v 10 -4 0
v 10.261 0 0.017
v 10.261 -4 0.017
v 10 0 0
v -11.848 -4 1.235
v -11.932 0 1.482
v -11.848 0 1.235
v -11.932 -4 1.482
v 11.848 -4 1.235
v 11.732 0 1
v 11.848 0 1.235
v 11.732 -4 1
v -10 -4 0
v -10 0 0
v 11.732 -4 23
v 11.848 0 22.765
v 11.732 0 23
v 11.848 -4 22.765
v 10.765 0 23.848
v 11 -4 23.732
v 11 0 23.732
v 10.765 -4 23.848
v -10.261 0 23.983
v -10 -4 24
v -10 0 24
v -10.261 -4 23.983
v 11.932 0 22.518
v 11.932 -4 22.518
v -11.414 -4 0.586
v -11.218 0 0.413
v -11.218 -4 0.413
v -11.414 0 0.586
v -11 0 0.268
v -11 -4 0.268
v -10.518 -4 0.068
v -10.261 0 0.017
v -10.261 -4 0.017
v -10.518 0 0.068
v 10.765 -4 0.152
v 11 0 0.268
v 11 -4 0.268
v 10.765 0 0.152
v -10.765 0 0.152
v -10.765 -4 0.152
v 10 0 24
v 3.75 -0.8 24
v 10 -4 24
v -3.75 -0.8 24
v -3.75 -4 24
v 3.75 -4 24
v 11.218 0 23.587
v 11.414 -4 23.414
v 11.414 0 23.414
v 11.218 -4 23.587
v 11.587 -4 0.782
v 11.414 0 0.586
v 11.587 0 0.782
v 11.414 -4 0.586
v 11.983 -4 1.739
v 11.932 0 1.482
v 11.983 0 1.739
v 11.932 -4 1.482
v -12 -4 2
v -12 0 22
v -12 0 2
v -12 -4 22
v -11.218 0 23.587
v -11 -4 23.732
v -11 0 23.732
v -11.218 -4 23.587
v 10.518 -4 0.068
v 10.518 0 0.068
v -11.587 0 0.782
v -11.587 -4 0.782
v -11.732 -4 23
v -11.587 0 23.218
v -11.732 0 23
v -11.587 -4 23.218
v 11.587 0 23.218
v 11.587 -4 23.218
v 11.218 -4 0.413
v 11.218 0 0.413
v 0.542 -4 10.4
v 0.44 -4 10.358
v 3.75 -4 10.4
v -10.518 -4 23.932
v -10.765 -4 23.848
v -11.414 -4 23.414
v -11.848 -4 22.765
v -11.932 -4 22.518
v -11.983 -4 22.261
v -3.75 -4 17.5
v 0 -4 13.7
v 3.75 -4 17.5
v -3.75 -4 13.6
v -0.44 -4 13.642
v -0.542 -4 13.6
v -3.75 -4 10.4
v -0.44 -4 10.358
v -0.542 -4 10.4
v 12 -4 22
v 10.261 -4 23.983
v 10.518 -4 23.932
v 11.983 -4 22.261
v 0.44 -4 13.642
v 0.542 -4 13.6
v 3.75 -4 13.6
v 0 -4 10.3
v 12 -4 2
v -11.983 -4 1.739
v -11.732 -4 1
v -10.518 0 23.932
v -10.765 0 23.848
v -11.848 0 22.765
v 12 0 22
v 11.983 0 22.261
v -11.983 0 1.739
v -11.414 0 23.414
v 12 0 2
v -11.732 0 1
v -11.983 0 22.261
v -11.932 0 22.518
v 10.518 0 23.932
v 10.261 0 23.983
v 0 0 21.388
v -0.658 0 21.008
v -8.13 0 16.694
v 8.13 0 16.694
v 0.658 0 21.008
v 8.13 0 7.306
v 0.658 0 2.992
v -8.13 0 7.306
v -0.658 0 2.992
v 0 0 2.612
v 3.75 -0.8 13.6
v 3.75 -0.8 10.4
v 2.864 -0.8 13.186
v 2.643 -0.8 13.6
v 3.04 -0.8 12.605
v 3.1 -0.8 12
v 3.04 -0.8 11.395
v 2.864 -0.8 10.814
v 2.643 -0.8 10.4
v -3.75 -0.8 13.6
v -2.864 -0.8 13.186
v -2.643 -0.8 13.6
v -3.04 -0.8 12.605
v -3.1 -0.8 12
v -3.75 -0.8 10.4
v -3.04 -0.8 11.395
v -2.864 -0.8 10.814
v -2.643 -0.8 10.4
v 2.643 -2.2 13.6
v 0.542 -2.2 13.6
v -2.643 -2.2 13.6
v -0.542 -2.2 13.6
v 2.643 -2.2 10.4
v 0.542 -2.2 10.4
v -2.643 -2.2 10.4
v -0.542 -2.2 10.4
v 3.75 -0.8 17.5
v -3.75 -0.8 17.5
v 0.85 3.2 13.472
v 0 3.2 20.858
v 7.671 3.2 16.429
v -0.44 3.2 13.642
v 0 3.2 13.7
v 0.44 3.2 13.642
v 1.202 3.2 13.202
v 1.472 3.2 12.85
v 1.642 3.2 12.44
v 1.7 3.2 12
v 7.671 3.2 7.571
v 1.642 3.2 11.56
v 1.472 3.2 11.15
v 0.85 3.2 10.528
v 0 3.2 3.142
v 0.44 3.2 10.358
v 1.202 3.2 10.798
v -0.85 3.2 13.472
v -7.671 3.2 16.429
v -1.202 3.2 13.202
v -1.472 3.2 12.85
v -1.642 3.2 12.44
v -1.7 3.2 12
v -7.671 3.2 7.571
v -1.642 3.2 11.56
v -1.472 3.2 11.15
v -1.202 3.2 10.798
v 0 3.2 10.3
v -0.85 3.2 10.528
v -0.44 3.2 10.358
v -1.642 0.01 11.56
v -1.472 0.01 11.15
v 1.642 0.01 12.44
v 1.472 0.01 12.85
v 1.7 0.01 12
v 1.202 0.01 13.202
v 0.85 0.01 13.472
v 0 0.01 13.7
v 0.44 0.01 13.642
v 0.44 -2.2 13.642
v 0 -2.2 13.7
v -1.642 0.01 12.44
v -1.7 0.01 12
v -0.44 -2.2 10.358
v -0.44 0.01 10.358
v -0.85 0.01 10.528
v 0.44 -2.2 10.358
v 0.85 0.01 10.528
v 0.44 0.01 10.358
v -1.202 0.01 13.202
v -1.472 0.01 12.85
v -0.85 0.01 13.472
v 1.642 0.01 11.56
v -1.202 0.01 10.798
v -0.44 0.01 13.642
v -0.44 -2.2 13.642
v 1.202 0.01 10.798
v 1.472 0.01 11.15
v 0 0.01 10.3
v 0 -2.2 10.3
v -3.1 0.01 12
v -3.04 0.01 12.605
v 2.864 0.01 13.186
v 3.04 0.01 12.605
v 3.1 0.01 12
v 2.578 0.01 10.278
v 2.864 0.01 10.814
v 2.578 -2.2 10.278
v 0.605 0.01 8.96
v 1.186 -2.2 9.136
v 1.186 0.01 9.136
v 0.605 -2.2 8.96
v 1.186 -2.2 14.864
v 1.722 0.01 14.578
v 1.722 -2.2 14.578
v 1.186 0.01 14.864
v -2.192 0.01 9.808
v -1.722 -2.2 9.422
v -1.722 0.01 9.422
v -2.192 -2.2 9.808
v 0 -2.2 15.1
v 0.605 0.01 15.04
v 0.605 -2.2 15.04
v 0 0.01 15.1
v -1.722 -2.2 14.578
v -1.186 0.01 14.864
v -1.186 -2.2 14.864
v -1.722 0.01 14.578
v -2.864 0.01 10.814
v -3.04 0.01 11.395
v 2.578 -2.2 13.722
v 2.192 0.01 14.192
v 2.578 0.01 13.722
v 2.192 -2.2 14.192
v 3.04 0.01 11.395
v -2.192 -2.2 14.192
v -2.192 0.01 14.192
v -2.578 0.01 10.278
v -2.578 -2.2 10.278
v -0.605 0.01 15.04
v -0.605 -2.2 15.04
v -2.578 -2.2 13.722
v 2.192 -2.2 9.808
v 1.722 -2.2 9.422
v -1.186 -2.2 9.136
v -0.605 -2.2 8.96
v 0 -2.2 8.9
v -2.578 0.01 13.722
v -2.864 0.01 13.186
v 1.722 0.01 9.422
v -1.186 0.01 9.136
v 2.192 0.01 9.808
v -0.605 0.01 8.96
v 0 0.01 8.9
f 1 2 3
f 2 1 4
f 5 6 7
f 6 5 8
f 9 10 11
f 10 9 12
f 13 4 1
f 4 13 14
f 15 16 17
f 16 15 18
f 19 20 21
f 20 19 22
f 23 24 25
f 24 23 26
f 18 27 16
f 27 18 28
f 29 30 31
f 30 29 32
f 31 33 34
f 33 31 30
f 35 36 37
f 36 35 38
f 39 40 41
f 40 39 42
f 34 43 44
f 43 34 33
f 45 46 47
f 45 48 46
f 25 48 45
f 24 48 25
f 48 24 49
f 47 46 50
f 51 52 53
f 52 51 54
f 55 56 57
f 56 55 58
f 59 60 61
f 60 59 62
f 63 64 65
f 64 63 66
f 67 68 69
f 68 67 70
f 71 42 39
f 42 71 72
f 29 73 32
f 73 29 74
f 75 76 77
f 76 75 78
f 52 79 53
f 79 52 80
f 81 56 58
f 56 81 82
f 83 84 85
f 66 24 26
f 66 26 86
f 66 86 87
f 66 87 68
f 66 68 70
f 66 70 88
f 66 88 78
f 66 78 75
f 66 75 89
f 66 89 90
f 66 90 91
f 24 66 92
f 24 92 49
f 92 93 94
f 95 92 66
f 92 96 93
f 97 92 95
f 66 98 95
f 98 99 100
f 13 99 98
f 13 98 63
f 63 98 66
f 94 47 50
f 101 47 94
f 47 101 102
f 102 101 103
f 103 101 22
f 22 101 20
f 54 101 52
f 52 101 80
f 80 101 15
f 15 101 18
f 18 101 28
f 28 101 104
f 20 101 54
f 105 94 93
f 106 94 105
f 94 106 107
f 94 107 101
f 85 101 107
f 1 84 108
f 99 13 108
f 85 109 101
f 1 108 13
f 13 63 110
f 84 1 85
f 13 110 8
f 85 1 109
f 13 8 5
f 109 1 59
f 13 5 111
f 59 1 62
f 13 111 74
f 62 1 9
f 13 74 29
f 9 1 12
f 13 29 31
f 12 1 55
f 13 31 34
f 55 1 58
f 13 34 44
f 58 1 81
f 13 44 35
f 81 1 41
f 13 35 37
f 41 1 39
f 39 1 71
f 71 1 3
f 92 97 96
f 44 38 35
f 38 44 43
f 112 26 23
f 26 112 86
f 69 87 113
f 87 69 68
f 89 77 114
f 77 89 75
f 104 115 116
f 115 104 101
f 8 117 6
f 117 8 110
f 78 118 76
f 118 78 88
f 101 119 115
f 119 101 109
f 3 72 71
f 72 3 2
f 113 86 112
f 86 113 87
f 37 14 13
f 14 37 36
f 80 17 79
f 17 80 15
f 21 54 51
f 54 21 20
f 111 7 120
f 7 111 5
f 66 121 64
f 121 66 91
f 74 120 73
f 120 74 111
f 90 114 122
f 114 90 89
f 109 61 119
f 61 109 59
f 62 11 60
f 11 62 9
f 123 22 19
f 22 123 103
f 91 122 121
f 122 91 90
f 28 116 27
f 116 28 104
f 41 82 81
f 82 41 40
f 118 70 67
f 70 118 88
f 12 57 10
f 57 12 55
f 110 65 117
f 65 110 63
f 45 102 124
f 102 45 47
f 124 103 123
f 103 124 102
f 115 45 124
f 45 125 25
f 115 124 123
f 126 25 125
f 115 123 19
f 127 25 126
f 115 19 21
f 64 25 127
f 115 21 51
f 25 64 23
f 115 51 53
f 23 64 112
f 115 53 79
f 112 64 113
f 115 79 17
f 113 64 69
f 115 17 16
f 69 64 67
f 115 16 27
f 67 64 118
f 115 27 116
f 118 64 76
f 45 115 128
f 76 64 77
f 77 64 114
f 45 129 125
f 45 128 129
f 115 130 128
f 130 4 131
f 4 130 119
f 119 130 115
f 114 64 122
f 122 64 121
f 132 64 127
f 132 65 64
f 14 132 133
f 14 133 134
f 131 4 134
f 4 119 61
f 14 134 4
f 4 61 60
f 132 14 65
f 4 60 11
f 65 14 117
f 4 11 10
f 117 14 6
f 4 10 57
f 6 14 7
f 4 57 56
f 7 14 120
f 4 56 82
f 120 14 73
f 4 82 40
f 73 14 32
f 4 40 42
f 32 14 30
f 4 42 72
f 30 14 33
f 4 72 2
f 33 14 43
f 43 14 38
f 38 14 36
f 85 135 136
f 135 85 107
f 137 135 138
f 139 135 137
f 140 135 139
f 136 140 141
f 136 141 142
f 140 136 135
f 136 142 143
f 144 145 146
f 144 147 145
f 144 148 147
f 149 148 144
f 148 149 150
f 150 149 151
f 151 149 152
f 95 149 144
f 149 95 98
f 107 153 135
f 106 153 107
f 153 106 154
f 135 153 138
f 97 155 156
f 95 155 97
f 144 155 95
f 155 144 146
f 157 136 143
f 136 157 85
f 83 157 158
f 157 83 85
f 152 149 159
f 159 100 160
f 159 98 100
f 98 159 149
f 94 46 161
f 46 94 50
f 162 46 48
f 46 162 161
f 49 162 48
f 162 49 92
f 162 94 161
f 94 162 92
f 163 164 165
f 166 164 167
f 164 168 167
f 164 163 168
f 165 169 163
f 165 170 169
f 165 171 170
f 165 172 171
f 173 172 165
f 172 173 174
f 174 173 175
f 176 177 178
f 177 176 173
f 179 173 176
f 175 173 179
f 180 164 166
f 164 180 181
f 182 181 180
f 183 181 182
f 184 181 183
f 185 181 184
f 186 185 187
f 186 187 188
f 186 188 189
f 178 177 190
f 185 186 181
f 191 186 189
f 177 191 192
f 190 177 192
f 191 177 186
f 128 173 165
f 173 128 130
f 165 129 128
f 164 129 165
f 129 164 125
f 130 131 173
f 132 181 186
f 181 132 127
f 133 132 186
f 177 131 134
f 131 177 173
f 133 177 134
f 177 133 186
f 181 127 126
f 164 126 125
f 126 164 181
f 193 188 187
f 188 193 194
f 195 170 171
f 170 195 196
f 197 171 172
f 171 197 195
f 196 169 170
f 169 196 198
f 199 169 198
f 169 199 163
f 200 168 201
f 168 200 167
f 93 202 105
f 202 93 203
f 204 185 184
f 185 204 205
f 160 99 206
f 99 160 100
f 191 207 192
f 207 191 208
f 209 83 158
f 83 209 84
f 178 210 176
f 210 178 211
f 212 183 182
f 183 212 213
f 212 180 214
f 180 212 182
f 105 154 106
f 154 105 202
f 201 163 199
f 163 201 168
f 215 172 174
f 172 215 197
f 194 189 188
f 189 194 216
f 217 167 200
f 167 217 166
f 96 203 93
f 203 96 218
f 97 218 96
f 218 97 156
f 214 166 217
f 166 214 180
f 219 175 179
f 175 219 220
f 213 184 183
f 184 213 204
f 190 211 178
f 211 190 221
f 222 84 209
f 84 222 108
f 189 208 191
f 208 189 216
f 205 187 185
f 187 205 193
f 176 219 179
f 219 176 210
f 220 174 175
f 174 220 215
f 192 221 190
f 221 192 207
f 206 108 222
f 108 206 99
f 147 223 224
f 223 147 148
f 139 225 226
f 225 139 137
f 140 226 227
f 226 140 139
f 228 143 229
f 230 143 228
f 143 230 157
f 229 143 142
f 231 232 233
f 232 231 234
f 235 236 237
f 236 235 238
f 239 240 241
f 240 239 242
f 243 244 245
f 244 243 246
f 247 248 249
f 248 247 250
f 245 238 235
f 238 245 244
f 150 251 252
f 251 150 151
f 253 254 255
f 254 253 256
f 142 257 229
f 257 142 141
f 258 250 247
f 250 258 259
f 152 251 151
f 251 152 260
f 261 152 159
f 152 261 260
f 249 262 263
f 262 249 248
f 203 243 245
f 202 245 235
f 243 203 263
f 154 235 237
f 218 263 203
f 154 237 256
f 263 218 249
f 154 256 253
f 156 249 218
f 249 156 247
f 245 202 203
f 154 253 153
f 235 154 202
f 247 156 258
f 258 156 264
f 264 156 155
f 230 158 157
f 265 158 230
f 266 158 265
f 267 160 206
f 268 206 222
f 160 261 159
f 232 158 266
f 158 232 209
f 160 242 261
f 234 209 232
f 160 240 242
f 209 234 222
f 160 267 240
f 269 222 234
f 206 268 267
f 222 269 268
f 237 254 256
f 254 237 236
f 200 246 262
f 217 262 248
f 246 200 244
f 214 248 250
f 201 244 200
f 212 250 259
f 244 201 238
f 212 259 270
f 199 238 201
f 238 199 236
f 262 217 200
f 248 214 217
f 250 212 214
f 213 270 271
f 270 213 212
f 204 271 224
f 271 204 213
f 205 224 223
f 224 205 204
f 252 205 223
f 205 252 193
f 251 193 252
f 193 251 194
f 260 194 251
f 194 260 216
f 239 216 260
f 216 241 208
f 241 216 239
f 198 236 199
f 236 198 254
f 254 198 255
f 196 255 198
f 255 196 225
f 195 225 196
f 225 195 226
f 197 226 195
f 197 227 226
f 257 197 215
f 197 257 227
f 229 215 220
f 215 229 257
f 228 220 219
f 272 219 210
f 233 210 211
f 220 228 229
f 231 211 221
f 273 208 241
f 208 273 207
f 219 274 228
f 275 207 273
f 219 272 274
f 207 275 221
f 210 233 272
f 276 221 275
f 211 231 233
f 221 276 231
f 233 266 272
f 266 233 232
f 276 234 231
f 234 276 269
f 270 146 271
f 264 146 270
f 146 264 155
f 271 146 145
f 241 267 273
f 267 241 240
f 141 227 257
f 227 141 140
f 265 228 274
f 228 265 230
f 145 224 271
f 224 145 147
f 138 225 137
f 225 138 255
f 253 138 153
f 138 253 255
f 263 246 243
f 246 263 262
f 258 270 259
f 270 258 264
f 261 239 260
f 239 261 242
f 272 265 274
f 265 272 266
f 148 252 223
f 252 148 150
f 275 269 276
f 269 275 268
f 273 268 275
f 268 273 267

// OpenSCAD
// file: rm_common.scad
// RobotMind V1 mechanical standard. All dimensions are millimetres.
$fn = 48;

RM_UNIT = 40;
RM_PLATE_T = 12;
RM_FIT = 0; // positive is looser; tune in 0.05 mm steps

// One carrier joint: a progressive hex press fit plus an optional M3 lock.
RM_SOCKET_DEPTH = 3.4;
RM_HEX_AF = 16;
RM_HEX_R = RM_HEX_AF/sqrt(3);
RM_HEX_TAPER = 0.28;
RM_HEX_ENTRY_CLEARANCE = 0.10+RM_FIT;
RM_HEX_GRIP = 0.20-RM_FIT;
RM_HEX_PITCH = 20;
RM_HEX_X = RM_HEX_PITCH;
RM_HEX_Y = sqrt(3)/2*RM_HEX_PITCH;

// Plate-to-plate 90° box joint: integral tabs enter open edge slots.
RM_JOIN_PITCH = 10;
RM_JOIN_LENGTH = 3.0;
RM_JOIN_W = 6;
RM_JOIN_CLEARANCE = 0.06+RM_FIT;
RM_M3_CLEARANCE = 3.4;
RM_M3_PILOT = 2.6;
RM_M3_HEAD = 6.2;
RM_M3_INSERT_HOLE = 4.0; // tune for the chosen M3 heat-set insert
RM_M3_INSERT_LENGTH = 5.0;
RM_M3_MEMBRANE = 0.3;
RM_M3_BLIND_DEPTH =
  (RM_PLATE_T-2*RM_SOCKET_DEPTH-RM_M3_MEMBRANE)/2;

assert(RM_PLATE_T > 2 * RM_SOCKET_DEPTH,
       "Plate needs a solid web between its two carrier sockets");
assert(RM_HEX_ENTRY_CLEARANCE >= 0 && RM_HEX_GRIP > 0 &&
       RM_JOIN_CLEARANCE >= 0,
       "RM_FIT is outside the printable range");
assert(RM_M3_BLIND_DEPTH > 0,
       "Plate is too thin for double-sided M3 insert pockets");
assert(2*RM_M3_BLIND_DEPTH+RM_M3_MEMBRANE >= RM_M3_INSERT_LENGTH,
       "Plate web is too thin for the M3 insert");

module rounded_box(size=[20,20,3], r=2, center=false) {
  x=size[0]; y=size[1]; z=size[2];
  translate(center ? [-x/2,-y/2,-z/2] : [0,0,0])
    linear_extrude(height=z)
      offset(r=r) offset(delta=-r) square([x,y]);
}

module print_on_x_edge(span) {
  translate([0,0,span/2]) rotate([0,90,0]) children();
}

module print_on_y_edge(span) {
  translate([0,0,span/2]) rotate([90,0,0]) children();
}

module hex_frustum(r1=RM_HEX_R, r2=RM_HEX_R, h=1) {
  rotate([0,0,30]) cylinder(r1=r1,r2=r2,h=h,$fn=6);
}

module top_socket_cut() {
  union() {
    translate([0,0,RM_PLATE_T-RM_SOCKET_DEPTH])
      hex_frustum(RM_HEX_R-RM_HEX_TAPER,
                   RM_HEX_R,
                   RM_SOCKET_DEPTH+0.1);
    translate([0,0,RM_PLATE_T-RM_SOCKET_DEPTH-RM_M3_BLIND_DEPTH])
      cylinder(h=RM_M3_BLIND_DEPTH+0.1,d=RM_M3_INSERT_HOLE,$fn=24);
  }
}

module bottom_socket_cut() {
  union() {
    translate([0,0,-0.1])
      hex_frustum(RM_HEX_R,
                   RM_HEX_R-RM_HEX_TAPER,
                   RM_SOCKET_DEPTH+0.1);
    translate([0,0,RM_SOCKET_DEPTH-0.1])
      cylinder(h=RM_M3_BLIND_DEPTH+0.1,d=RM_M3_INSERT_HOLE,$fn=24);
  }
}

module socket_pair() {
  top_socket_cut();
  bottom_socket_cut();
}

// Triangular lattice. Female edges reserve enough material for corner slots;
// the 5.5 mm origin shift keeps the 20 mm pitch and centers the usable area.
module dense_socket_grid(size=[2*RM_UNIT,2*RM_UNIT]) {
  rows=ceil(size[1]/RM_HEX_Y)+2;
  cols=ceil(size[0]/RM_HEX_X)+2;
  female_margin=RM_PLATE_T+1;
  male_margin=2;
  origin=(female_margin-male_margin)/2;
  for(row=[-rows:rows], col=[-cols:cols]) {
    y=origin+row*RM_HEX_Y;
    x=origin+(col + ((abs(row)%2)==1 ? 0.5 : 0))*RM_HEX_X;
    if(x-RM_HEX_AF/2 >= -size[0]/2+female_margin &&
       x+RM_HEX_AF/2 <= size[0]/2-male_margin &&
       y-RM_HEX_R >= -size[1]/2+female_margin &&
       y+RM_HEX_R <= size[1]/2-male_margin)
      translate([x,y,0]) socket_pair();
  }
}

function join_index(p,edge_len) =
  round((p+edge_len/2-RM_JOIN_PITCH/2)/RM_JOIN_PITCH);
function is_m3_join(p,edge_len) = join_index(p,edge_len)%4 == 1;

// Integral rectangular tabs on an A edge (+Y in local coordinates).
module male_edge(edge_len, plate_half) {
  for(p=[-edge_len/2+RM_JOIN_PITCH/2:
         RM_JOIN_PITCH:
         edge_len/2-RM_JOIN_PITCH/2])
    translate([p-RM_JOIN_W/2,plate_half-0.05,0])
      cube([RM_JOIN_W,RM_JOIN_LENGTH+0.05,RM_PLATE_T]);
}

// Blind thread-forming pilots continue through selected tabs into the edge.
module male_edge_m3_cuts(edge_len, plate_half) {
  for(p=[-edge_len/2+RM_JOIN_PITCH/2:
         RM_JOIN_PITCH:
         edge_len/2-RM_JOIN_PITCH/2])
    if(is_m3_join(p,edge_len))
      translate([p,plate_half-4,RM_PLATE_T/2])
        rotate([-90,0,0])
          cylinder(h=RM_JOIN_LENGTH+4.2,d=RM_M3_PILOT,$fn=24);
}

// Female B edge (-Y): open slots accept tabs from either face at 90°.
module female_edge_cuts(edge_len, plate_half) {
  for(p=[-edge_len/2+RM_JOIN_PITCH/2:
         RM_JOIN_PITCH:
         edge_len/2-RM_JOIN_PITCH/2]) {
    translate([p-RM_JOIN_W/2-RM_JOIN_CLEARANCE,
               -plate_half-0.1,-0.1])
      cube([RM_JOIN_W+2*RM_JOIN_CLEARANCE,
            RM_PLATE_T+RM_JOIN_CLEARANCE,
            RM_JOIN_LENGTH+0.1]);
    translate([p-RM_JOIN_W/2-RM_JOIN_CLEARANCE,
               -plate_half-0.1,RM_PLATE_T-RM_JOIN_LENGTH])
      cube([RM_JOIN_W+2*RM_JOIN_CLEARANCE,
            RM_PLATE_T+RM_JOIN_CLEARANCE,
            RM_JOIN_LENGTH+0.1]);
    if(is_m3_join(p,edge_len)) {
      translate([p,-plate_half+RM_PLATE_T/2,-0.1])
        cylinder(h=RM_PLATE_T+0.2,d=RM_M3_CLEARANCE,$fn=24);
    }
  }
}

// Identical plates: tabs on +X/+Y and 90° slots on -X/-Y.
module plate(size=[2*RM_UNIT,2*RM_UNIT]) {
  assert(size[0] % RM_UNIT == 0 && size[1] % RM_UNIT == 0,
         "Plate dimensions must be whole 40 mm units");
  difference() {
    union() {
      translate([-size[0]/2,-size[1]/2,0])
        rounded_box([size[0],size[1],RM_PLATE_T],1.5);
      male_edge(size[0],size[1]/2);
      rotate([0,0,-90]) male_edge(size[1],size[0]/2);
    }
    dense_socket_grid(size);
    female_edge_cuts(size[0],size[1]/2);
    rotate([0,0,-90]) female_edge_cuts(size[1],size[0]/2);
    male_edge_m3_cuts(size[0],size[1]/2);
    rotate([0,0,-90]) male_edge_m3_cuts(size[1],size[0]/2);
  }
}

// The tip enters freely; the last fraction of travel supplies the grip.
module integral_hex_plug() {
  translate([0,0,-RM_SOCKET_DEPTH+0.2])
    hex_frustum(RM_HEX_R-RM_HEX_TAPER-RM_HEX_ENTRY_CLEARANCE,
                 RM_HEX_R+RM_HEX_GRIP,
                 RM_SOCKET_DEPTH+0.1);
}

// Adds the universal plug. M3 is optional: the press fit works alone.
module carrier_mount() {
  difference() {
    union() {
      children();
      integral_hex_plug();
    }
    translate([0,0,-RM_SOCKET_DEPTH])
      cylinder(h=RM_SOCKET_DEPTH+100,d=RM_M3_CLEARANCE,$fn=24);
    translate([0,0,-0.01])
      cylinder(h=2.21,d=RM_M3_HEAD,$fn=32);
  }
}

module sensor_carrier(pcb=[20,20], wall=1.7, floor=1.8, clearance=0.5) {
  W=pcb[0]+2*(wall+clearance);
  L=pcb[1]+2*(wall+clearance);
  assert(W >= 2*(RM_HEX_R+RM_HEX_GRIP),
         "Carrier is narrower than its integral hex plug");
  carrier_mount() union() {
    translate([-W/2,-L/2,0]) difference() {
      rounded_box([W,L,floor+3.1],2);
      translate([wall,wall,floor])
        rounded_box([pcb[0]+2*clearance,pcb[1]+2*clearance,5],1);
      translate([W/2-6,-0.2,floor+0.5]) cube([12,wall+1,3.5]);
    }
    for(x=[-W/2+2.2,W/2-2.2], y=[-L/2+2.2,L/2-2.2])
      translate([x,y,floor+2.5]) cylinder(h=1.3,d=2.2);
  }
}

module tag_insert(tag=[60,60], border=3, t=1) {
  W=tag[0]+2*border; H=tag[1]+2*border;
  union() {
    translate([-W/2,-H/2,0]) rounded_box([W,H,t],1.2);
    translate([-8,-H/2-4,0]) rounded_box([16,5,t],1.2);
  }
}

module tag_insert_rails(tag=[60,60], border=4, rail=1.5,
                        depth=2.2, clearance=0.25, lip=0.8, lip_t=0.6) {
  W=tag[0]+2*border; H=tag[1]+2*border;
  for(sx=[-1,1]) {
    x=sx>0 ? W/2+clearance : -W/2-clearance-rail;
    translate([x,-H/2-clearance,0])
      cube([rail,H+2*clearance+rail,depth]);
    translate([sx>0 ? W/2-lip : -W/2-clearance-rail,
               -H/2-clearance,depth-lip_t])
      cube([rail+clearance+lip,H+2*clearance+rail,lip_t]);
  }
  translate([-W/2-clearance-rail,H/2+clearance,0])
    cube([W+2*(clearance+rail),rail,depth]);
}
// main file
include <rm_common.scad>

CABLE_W=7.5;
CABLE_H=2.2;
BASE=24;

module grove_cable_clip_carrier() {
  carrier_mount() {
    difference() {
      translate([-BASE/2,-BASE/2,0]) rounded_box([BASE,BASE,4],2);
      translate([0,0,2.8]) cube([CABLE_W,CABLE_H+1,4],center=true);
      translate([0,BASE/2-3,2.8]) cube([CABLE_W,7,4],center=true);
    }
  }
}

print_on_y_edge(BASE) grove_cable_clip_carrier();
